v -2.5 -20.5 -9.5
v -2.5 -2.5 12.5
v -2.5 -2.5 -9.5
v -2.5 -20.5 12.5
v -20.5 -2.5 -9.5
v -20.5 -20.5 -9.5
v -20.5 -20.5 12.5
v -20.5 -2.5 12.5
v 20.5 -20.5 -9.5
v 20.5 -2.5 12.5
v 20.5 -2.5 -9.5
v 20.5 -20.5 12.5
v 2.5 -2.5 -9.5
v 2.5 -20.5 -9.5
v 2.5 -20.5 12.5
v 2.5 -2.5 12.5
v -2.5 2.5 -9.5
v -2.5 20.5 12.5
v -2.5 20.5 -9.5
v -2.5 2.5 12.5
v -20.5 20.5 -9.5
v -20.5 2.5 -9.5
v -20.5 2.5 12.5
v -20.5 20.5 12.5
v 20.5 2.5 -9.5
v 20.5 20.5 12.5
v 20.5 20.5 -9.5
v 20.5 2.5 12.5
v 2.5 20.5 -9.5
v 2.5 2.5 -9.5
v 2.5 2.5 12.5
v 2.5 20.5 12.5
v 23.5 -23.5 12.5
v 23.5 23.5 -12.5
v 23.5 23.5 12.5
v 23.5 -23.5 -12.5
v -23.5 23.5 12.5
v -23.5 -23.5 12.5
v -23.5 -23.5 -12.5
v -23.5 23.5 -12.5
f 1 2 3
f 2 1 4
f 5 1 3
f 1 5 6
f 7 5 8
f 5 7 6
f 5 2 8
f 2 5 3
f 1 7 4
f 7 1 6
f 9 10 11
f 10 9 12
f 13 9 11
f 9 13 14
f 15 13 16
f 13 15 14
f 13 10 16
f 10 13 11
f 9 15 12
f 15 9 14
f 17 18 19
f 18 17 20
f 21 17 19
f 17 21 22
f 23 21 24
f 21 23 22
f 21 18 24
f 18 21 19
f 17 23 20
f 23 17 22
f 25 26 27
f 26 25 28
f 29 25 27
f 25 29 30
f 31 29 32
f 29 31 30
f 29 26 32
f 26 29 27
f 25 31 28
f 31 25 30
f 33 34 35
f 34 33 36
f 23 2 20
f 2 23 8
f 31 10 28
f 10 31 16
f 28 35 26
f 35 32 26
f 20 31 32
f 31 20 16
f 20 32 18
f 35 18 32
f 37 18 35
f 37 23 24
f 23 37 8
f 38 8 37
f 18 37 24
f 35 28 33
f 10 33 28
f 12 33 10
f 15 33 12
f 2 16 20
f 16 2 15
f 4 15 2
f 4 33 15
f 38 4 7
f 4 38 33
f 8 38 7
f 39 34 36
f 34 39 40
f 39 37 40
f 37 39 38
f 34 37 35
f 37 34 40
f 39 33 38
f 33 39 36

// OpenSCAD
$fn = 32;

// ----------------------------------------------------------------------
// Pocket plate 47 x 47 x 25
// 2 x 2 pockets 18 mm square, 22 mm deep
// ----------------------------------------------------------------------

// --- parameters (mm) ---
thickness = 25;  // plate thickness
floor_t = 3;     // material left under each pocket
pocket = 18;     // pocket side length
pitch_x = 23;    // pocket pitch along X
pitch_y = 23;    // pocket pitch along Y
cols = 2;        // pockets per row
rows = 2;        // rows of pockets

// --- derived feature positions (mm) ---
depth = thickness - floor_t;        // = 22   pocket depth, down to the floor
span_x = (cols - 1) * pitch_x;      // = 23   distance between outer pockets
span_y = (rows - 1) * pitch_y;      // = 23   distance between outer pocket rows
origin_x = -span_x / 2;             // = -11.5   X of the first pocket
origin_y = -span_y / 2;             // = -11.5   Y of the first pocket
plate = [span_x + pocket + 6, span_y + pocket + 6, thickness];  // = [47, 47, 25]   overall size: pockets plus 3 mm of wall on each side
feature_centers = [
  [origin_x + 0 * pitch_x, origin_y + 0 * pitch_y],
  [origin_x + 1 * pitch_x, origin_y + 0 * pitch_y],
  [origin_x + 0 * pitch_x, origin_y + 1 * pitch_y],
  [origin_x + 1 * pitch_x, origin_y + 1 * pitch_y]
];   // pocket centres, used verbatim by the cutter loop

// plate outline, then one pocket per centre in feature_centers
difference() {
  cube(plate, center = true);
  for (centre = feature_centers)
    translate([centre[0] - pocket / 2, centre[1] - pocket / 2, plate[2] / 2 - depth])
      cube([pocket, pocket, depth + 1]);  // centred on the declared pocket centre
}
